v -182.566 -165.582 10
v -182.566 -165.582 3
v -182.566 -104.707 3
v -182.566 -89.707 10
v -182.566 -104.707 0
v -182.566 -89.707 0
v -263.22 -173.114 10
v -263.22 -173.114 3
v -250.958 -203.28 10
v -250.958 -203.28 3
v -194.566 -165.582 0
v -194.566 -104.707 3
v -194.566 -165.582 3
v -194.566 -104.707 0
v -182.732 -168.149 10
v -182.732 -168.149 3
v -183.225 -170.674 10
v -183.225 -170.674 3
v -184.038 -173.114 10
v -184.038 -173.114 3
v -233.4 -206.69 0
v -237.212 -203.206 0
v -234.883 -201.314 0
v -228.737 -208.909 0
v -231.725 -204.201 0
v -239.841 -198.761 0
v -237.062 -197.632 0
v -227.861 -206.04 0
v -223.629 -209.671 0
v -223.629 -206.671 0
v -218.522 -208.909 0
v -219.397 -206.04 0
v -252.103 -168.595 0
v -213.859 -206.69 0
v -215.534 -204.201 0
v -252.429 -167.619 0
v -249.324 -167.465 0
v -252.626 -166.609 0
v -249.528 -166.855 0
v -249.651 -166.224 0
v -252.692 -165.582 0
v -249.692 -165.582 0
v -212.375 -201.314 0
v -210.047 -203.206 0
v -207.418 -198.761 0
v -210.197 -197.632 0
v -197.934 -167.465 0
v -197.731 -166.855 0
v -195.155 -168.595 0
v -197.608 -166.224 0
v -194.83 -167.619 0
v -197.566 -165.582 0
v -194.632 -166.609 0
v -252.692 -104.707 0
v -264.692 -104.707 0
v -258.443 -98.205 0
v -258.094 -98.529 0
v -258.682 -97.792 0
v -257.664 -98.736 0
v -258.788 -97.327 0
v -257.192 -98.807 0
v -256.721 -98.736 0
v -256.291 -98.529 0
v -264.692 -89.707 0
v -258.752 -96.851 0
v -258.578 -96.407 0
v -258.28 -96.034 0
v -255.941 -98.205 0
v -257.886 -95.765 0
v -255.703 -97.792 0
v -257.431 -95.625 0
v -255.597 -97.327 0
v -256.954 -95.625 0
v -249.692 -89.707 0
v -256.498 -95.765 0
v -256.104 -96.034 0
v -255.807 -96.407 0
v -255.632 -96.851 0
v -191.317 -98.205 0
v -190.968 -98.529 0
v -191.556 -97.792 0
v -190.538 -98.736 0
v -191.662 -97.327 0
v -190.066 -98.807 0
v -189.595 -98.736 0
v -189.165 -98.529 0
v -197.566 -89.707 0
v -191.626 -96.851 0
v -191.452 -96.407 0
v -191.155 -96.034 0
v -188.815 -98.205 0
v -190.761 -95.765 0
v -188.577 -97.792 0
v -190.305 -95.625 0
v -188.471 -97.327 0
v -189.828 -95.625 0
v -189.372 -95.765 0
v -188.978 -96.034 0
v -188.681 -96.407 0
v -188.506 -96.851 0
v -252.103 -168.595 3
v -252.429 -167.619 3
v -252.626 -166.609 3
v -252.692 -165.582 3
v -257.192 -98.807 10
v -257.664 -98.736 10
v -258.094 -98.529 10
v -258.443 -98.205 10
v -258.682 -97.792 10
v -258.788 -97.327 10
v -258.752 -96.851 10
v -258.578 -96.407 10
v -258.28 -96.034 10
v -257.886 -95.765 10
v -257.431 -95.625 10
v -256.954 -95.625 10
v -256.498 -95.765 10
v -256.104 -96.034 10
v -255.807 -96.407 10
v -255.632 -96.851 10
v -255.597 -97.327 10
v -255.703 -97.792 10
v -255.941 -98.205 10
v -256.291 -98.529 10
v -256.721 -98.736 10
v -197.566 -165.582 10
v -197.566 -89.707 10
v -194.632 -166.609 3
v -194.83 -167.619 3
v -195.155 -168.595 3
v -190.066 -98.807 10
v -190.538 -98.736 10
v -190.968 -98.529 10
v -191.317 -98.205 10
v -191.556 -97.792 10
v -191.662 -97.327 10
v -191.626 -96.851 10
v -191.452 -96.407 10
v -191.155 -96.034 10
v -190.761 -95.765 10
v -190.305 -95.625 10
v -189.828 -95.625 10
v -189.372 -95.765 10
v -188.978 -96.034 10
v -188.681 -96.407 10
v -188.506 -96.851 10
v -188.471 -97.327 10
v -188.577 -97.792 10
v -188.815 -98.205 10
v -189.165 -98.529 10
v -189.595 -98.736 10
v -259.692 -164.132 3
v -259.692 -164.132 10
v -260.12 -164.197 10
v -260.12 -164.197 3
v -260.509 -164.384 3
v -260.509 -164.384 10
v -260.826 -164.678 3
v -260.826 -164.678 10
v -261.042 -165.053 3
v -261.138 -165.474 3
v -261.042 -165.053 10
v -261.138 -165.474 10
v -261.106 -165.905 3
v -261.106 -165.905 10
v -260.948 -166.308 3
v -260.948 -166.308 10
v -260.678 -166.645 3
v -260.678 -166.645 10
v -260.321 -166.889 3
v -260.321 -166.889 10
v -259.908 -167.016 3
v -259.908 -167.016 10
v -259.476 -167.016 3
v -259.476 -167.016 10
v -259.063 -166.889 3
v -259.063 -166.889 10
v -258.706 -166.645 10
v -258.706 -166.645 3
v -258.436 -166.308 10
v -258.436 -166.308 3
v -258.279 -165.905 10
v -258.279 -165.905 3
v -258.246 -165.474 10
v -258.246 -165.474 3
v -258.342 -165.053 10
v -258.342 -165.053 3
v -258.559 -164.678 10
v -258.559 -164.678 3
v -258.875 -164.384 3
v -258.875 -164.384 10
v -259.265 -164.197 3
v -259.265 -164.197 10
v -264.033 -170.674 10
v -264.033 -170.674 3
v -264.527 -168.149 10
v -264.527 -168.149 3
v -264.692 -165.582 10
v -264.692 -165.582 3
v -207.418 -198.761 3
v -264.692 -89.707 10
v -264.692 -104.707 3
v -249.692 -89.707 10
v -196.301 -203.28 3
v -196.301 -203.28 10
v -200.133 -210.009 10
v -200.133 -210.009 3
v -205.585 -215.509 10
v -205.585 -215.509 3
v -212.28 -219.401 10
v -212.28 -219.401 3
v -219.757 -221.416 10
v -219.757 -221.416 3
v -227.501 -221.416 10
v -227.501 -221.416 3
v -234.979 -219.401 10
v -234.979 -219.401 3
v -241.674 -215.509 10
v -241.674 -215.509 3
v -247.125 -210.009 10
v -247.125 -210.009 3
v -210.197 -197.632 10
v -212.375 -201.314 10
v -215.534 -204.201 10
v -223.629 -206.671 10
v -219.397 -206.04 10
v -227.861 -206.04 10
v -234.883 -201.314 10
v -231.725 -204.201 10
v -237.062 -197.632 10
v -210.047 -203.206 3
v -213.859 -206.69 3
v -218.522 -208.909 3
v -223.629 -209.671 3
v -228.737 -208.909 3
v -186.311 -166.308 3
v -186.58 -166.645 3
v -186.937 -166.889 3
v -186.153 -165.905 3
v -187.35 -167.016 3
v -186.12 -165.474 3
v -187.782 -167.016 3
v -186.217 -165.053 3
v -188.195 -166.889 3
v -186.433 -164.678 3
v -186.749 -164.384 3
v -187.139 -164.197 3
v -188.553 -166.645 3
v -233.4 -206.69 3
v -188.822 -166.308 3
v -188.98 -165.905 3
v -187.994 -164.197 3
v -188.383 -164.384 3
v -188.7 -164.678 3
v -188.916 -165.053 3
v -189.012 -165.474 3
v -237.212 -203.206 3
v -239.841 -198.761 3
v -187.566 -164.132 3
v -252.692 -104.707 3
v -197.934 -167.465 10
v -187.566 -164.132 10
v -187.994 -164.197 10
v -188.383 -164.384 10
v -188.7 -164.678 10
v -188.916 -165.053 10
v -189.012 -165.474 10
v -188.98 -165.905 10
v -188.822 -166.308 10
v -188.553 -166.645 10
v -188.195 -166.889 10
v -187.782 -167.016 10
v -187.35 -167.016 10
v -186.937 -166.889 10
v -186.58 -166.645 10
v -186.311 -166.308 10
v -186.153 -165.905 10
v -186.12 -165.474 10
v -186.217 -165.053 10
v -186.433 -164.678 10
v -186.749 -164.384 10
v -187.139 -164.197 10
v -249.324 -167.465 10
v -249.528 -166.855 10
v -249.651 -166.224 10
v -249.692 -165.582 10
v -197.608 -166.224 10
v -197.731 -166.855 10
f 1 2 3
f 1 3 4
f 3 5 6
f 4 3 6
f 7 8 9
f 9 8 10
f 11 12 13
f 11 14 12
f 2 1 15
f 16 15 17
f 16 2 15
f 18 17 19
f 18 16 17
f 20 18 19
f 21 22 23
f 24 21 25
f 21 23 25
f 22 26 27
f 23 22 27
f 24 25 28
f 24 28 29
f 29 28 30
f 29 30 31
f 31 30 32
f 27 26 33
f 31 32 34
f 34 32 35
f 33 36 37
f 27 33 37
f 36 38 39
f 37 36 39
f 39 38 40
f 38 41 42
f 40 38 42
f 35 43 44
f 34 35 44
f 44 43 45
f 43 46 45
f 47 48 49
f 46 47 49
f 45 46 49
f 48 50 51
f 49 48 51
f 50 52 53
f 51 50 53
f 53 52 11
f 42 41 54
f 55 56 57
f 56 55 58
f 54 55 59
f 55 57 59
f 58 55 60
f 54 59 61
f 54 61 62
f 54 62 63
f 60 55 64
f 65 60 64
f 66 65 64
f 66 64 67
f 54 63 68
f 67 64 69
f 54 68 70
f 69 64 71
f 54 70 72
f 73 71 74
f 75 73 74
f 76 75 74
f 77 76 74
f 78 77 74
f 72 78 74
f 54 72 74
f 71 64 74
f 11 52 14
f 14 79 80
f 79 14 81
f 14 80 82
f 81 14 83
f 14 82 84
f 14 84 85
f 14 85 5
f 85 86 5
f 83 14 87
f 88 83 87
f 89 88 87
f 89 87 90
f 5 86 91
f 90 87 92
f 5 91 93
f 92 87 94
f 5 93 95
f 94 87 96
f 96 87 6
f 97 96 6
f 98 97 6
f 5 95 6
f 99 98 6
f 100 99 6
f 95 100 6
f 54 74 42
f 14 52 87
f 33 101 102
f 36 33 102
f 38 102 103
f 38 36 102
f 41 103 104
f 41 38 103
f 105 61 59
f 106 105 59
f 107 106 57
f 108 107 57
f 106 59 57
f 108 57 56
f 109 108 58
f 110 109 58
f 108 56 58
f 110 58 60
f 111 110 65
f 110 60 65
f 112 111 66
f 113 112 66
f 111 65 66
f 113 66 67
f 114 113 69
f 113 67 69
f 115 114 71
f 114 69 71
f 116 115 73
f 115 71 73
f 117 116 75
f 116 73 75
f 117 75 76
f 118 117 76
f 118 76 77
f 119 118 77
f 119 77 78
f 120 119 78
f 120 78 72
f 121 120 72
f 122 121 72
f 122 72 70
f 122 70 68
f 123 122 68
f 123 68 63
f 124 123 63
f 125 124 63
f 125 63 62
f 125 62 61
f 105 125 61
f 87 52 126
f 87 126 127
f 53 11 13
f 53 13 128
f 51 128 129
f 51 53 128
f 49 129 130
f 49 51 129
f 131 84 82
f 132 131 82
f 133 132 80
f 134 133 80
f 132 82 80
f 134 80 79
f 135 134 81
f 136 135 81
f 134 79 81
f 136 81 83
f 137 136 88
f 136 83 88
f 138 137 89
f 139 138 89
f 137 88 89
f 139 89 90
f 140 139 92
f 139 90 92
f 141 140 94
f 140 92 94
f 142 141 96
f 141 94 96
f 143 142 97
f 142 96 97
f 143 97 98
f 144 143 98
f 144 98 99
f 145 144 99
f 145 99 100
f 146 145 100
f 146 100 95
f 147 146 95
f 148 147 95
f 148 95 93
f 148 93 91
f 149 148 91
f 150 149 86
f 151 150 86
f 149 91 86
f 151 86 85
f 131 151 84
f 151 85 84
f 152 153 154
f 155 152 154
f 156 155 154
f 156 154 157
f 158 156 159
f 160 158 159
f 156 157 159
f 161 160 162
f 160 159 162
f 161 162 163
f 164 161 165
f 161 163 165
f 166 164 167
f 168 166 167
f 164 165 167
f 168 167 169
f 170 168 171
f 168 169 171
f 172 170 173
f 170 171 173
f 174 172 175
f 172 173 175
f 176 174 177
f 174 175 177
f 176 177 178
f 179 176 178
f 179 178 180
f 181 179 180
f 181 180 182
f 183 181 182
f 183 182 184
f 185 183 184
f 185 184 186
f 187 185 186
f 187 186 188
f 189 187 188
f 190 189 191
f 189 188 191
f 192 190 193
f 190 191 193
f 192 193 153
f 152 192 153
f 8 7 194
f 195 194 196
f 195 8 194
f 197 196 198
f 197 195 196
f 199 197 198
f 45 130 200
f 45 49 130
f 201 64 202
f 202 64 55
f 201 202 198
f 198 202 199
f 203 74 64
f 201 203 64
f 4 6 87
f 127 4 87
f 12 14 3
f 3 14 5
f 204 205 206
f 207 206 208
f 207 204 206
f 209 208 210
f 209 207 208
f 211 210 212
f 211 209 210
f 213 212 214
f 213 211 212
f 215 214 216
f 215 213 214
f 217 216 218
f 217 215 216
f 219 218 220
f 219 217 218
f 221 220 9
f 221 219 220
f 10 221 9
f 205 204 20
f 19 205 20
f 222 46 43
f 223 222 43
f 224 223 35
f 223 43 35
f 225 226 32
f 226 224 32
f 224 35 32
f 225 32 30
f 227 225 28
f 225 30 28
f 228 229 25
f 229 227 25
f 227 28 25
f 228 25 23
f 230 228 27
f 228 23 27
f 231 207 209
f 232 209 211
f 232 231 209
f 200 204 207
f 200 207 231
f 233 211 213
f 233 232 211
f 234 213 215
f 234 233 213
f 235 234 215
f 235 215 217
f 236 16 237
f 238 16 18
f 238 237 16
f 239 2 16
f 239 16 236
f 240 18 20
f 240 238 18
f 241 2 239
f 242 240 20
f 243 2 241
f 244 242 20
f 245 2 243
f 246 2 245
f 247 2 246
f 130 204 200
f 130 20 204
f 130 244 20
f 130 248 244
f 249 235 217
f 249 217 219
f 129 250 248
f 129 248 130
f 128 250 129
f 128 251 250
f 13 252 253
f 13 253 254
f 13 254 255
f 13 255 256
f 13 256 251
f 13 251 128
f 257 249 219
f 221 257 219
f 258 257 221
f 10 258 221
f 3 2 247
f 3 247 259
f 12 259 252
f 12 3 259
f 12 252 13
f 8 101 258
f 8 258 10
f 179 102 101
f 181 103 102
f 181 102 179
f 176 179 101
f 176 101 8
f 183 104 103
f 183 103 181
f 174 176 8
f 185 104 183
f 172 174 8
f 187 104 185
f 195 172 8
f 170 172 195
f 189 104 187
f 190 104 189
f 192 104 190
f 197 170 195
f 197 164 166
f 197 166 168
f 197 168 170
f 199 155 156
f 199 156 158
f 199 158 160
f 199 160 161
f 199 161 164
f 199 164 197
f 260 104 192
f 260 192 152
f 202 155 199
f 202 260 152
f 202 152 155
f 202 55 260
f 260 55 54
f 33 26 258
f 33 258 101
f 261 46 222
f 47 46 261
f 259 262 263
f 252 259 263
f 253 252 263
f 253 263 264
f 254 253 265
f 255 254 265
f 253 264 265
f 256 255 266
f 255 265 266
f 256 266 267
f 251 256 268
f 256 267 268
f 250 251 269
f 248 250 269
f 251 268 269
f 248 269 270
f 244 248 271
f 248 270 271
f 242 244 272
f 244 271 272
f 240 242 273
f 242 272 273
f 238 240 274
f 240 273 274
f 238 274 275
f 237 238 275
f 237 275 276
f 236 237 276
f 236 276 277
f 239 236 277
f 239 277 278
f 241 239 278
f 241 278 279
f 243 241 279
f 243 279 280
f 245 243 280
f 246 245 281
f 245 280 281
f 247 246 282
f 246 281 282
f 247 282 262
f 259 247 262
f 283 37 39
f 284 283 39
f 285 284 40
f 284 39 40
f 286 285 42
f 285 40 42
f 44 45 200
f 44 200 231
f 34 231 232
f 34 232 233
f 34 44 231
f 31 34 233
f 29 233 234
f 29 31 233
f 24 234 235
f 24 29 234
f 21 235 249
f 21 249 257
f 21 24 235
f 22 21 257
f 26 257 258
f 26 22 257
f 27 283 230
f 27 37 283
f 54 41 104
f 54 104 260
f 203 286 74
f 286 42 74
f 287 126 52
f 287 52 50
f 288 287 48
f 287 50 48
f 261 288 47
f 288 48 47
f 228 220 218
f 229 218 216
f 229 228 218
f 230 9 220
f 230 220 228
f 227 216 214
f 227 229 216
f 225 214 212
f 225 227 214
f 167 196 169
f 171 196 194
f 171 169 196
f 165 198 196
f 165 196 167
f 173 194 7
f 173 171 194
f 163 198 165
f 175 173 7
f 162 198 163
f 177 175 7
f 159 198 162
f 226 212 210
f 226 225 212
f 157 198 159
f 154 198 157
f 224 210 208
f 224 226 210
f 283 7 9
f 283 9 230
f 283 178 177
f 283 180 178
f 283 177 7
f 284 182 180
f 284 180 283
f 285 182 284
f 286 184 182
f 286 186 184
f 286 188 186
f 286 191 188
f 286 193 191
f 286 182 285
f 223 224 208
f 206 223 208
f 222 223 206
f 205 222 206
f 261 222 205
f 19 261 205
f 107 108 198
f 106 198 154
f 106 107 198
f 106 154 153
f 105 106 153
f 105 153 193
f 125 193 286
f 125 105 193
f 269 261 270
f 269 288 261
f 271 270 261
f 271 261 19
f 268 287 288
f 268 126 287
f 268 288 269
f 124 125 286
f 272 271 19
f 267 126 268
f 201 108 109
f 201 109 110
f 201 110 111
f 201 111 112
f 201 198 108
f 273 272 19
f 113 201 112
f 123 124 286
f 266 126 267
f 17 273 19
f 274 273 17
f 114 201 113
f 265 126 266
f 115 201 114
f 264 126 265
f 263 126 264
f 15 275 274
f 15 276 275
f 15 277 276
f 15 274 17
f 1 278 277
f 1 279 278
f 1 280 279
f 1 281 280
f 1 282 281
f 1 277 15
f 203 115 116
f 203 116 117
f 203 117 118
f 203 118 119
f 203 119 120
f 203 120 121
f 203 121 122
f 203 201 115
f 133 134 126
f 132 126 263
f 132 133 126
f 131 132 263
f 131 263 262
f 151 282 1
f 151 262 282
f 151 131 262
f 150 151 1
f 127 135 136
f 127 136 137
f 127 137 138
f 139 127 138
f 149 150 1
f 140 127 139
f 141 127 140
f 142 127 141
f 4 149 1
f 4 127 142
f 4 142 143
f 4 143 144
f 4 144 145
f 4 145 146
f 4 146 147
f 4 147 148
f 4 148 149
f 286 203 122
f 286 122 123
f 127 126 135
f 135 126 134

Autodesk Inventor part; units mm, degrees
ref_plane "YZ Plane" through (0, 0, 0) normal (1, 0, 0) x (0, 1, 0)
ref_plane "XZ Plane" through (0, 0, 0) normal (0, 1, 0) x (-1, 0, 0)
ref_plane "XY Plane" through (0, 0, 0) normal (0, 0, 1) x (1, 0, 0)
sketch "Sketch13" plane through (0, 0, 0) normal (0, 0, 1) x (1, 0, 0)
  line L0 (-247.6922, -121.6988) -> (-240.7003, -114.707) projected
  line L1 (-240.7003, -114.707) -> (-206.5582, -114.707) projected
  line L2 (-206.5582, -114.707) -> (-199.5663, -121.6988) projected
  line L3 (-199.5663, -121.6988) -> (-199.5663, -165.5825) projected
  arc A0 (-199.7872, -166.7122) -> (-199.5663, -165.5825) centre (-202.5663, -165.5825) ccw projected
  line L4 (-199.7872, -166.7122) -> (-212.0494, -196.8785) projected
  arc A1 (-235.2091, -196.8785) -> (-212.0494, -196.8785) centre (-223.6293, -192.1714) ccw projected
  line L5 (-235.2091, -196.8785) -> (-247.4714, -166.7122) projected
  arc A2 (-247.6922, -165.5825) -> (-247.4714, -166.7122) centre (-244.6922, -165.5825) ccw projected
  line L6 (-247.6922, -165.5825) -> (-247.6922, -121.6988) projected
  circle A3 centre (-223.6293, -151.1714) radius 13 projected
  line L7 (26.8154, -89.707) -> (-473.1846, -89.707) projected
  line L8 (26.8154, -104.707) -> (-473.1846, -104.707) projected
  line L9 (-197.5663, -165.5825) -> (-197.5663, -120.8704)
  line L10 (-197.5663, -120.8704) -> (-205.7298, -112.707)
  line L11 (-205.7298, -112.707) -> (-241.5288, -112.707)
  line L12 (-241.5288, -112.707) -> (-249.6922, -120.8704)
  line L13 (-249.6922, -120.8704) -> (-249.6922, -165.5825)
  arc A4 (-249.6922, -165.5825) -> (-249.3242, -167.4653) centre (-244.6922, -165.5825) ccw
  line L14 (-249.3242, -167.4653) -> (-237.0619, -197.6316)
  arc A5 (-237.0619, -197.6316) -> (-210.1966, -197.6316) centre (-223.6293, -192.1714) ccw
  line L15 (-210.1966, -197.6316) -> (-197.9344, -167.4653)
  arc A6 (-197.9344, -167.4653) -> (-197.5663, -165.5825) centre (-202.5663, -165.5825) ccw
  line L16 (-182.5663, -165.5825) -> (-182.5663, -114.6572)
  line L17 (-182.5663, -114.6572) -> (-199.5166, -97.707)
  line L18 (-199.5166, -97.707) -> (-247.742, -97.707)
  line L19 (-247.742, -97.707) -> (-264.6922, -114.6572)
  line L20 (-264.6922, -114.6572) -> (-264.6922, -165.5825)
  arc A7 (-264.6922, -165.5825) -> (-263.22, -173.1138) centre (-244.6922, -165.5825) ccw
  line L21 (-263.22, -173.1138) -> (-250.9578, -203.2801)
  arc A8 (-250.9578, -203.2801) -> (-196.3008, -203.2801) centre (-223.6293, -192.1714) ccw
  line L22 (-196.3008, -203.2801) -> (-184.0385, -173.1138)
  arc A9 (-184.0385, -173.1138) -> (-182.5663, -165.5825) centre (-202.5663, -165.5825) ccw
  line L23 (-182.5663, -114.6572) -> (-182.5663, -89.707)
  line L24 (-264.6922, -114.6572) -> (-264.6922, -89.707)
  line L25 (-197.5663, -120.8704) -> (-197.5663, -89.707)
  line L26 (-249.6922, -120.8704) -> (-249.6922, -89.707)
  line L27 (-218.4828, -188.996) -> (-218.1293, -188.6424) projected
  line L28 (-218.1293, -188.6424) -> (-218.1293, -184.996) projected
  line L29 (-218.1293, -184.996) -> (-229.1293, -184.996) projected
  line L30 (-229.1293, -184.996) -> (-229.1293, -188.6424) projected
  line L31 (-229.1293, -188.6424) -> (-228.7757, -188.996) projected
  line L32 (-228.9525, -189.3022) -> (-229.4355, -189.1728) projected
  line L33 (-229.4355, -189.1728) -> (-232.5934, -190.996) projected
  line L34 (-223.806, -198.2161) -> (-228.9525, -189.3022) projected
  line L35 (-227.0934, -200.5223) -> (-223.9355, -198.6991) projected
  line L36 (-223.9355, -198.6991) -> (-223.806, -198.2161) projected
  line L37 (-223.4525, -198.2161) -> (-223.3231, -198.6991) projected
  line L38 (-223.3231, -198.6991) -> (-220.1652, -200.5223) projected
  line L39 (-218.306, -189.3022) -> (-223.4525, -198.2161) projected
  line L40 (-214.6652, -190.996) -> (-217.8231, -189.1728) projected
  line L41 (-217.8231, -189.1728) -> (-218.306, -189.3022) projected
  line L42 (-228.7757, -188.996) -> (-218.4828, -188.996) projected
  line L43 (-232.5934, -190.996) -> (-227.0934, -200.5223) projected
  line L44 (-220.1652, -200.5223) -> (-214.6652, -190.996) projected
  point P0 (0, 0)
  dimension "d26" = 2
  dimension "d27" = 15
extrude "Extrusion14" add sketch "Sketch13" along normal blind 10 contours L23 L8 L17 L25 L7 | L23 L17 L8 | L26 L19 L8 L24 L7 | L17 L8 L25 | L17 L16 A9 L22 A8 L21 A7 L20 L19 L8 L26 L13 A4 L14 A5 L15 A6 L9 L25 | L26 L8 L19 | L8 L19 L24
sketch "Sketch14" plane through (0, 0, 0) normal (0, 0, -1) x (-1, 0, 0)
  line L0 (249.6922, -165.5825) -> (249.6922, -89.707) projected
  arc A0 (249.3242, -167.4653) -> (249.6922, -165.5825) centre (244.6922, -165.5825) ccw projected
  line L1 (237.0619, -197.6316) -> (249.3242, -167.4653) projected
  arc A1 (210.1966, -197.6316) -> (237.0619, -197.6316) centre (223.6293, -192.1714) ccw projected
  line L2 (197.9344, -167.4653) -> (210.1966, -197.6316) projected
  arc A2 (197.5663, -165.5825) -> (197.9344, -167.4653) centre (202.5663, -165.5825) ccw projected
  line L3 (197.5663, -89.707) -> (197.5663, -165.5825) projected
  line L4 (182.5663, -89.707) -> (197.5663, -89.707) projected
  line L5 (182.5663, -165.5825) -> (182.5663, -89.707) projected
  arc A3 (182.5663, -165.5825) -> (184.0385, -173.1138) centre (202.5663, -165.5825) ccw projected
  line L6 (196.3008, -203.2801) -> (184.0385, -173.1138) projected
  arc A4 (196.3008, -203.2801) -> (250.9578, -203.2801) centre (223.6293, -192.1714) ccw projected
  line L7 (263.22, -173.1138) -> (250.9578, -203.2801) projected
  arc A5 (263.22, -173.1138) -> (264.6922, -165.5825) centre (244.6922, -165.5825) ccw projected
  line L8 (264.6922, -89.707) -> (264.6922, -165.5825) projected
  line L9 (249.6922, -89.707) -> (264.6922, -89.707) projected
  line L10 (185.5663, -92.707) -> (194.5663, -92.707)
  line L11 (194.5663, -92.707) -> (194.5663, -165.5825)
  arc A6 (194.5663, -165.5825) -> (195.1552, -168.595) centre (202.5663, -165.5825) ccw
  line L12 (195.1552, -168.595) -> (207.4175, -198.7613)
  arc A7 (207.4175, -198.7613) -> (239.8411, -198.7613) centre (223.6293, -192.1714) ccw
  line L13 (239.8411, -198.7613) -> (252.1033, -168.595)
  arc A8 (252.1033, -168.595) -> (252.6922, -165.5825) centre (244.6922, -165.5825) ccw
  line L14 (252.6922, -165.5825) -> (252.6922, -92.707)
  line L15 (252.6922, -92.707) -> (261.6922, -92.707)
  line L16 (261.6922, -92.707) -> (261.6922, -165.5825)
  arc A9 (260.4408, -171.9841) -> (261.6922, -165.5825) centre (244.6922, -165.5825) ccw
  line L17 (260.4408, -171.9841) -> (248.1786, -202.1504)
  arc A10 (199.0799, -202.1504) -> (248.1786, -202.1504) centre (223.6293, -192.1714) ccw
  line L18 (199.0799, -202.1504) -> (186.8177, -171.9841)
  arc A11 (185.5663, -165.5825) -> (186.8177, -171.9841) centre (202.5663, -165.5825) ccw
  line L19 (185.5663, -165.5825) -> (185.5663, -92.707)
  line L20 (194.5663, -92.707) -> (194.5663, -89.707)
  line L21 (182.5663, -89.707) -> (197.5663, -89.707) projected
  line L22 (252.6922, -92.707) -> (252.6922, -89.707)
  line L23 (197.5663, -89.707) -> (197.5663, -165.5825) projected
  line L24 (197.5663, -104.707) -> (182.5663, -104.707)
  line L25 (264.6922, -89.707) -> (264.6922, -165.5825) projected
  line L26 (264.6922, -104.707) -> (249.6922, -104.707)
  point P0 (0, 0)
  point P1 (194.5663, -104.707)
  point P2 (264.6922, -104.707)
  point P3 (252.6922, -104.707)
  dimension "d33" = 3
  dimension "d34" = 15
extrude "Extrusion15" cut sketch "Sketch14" against normal blind 3 contours L26 L16 A9 L17 A10 L18 A11 L19 L24 L11 A6 L12 A7 L13 A8 L14 | L26 L8 A5 L7 A4 L6 A3 L5 L24 L19 A11 L18 A10 L17 A9 L16
sketch "Sketch15" plane through (0, 0, 3) normal (0, 0, -1) x (-1, 0, 0)
  line L0 (182.5663, -165.5825) -> (182.5663, -104.707) projected
  line L1 (264.6922, -104.707) -> (264.6922, -165.5825) projected
  point P0 (0, 0)
  point P1 (187.5663, -165.5825)
  point P2 (259.6922, -165.5825)
  dimension "d35" = 5
  dimension "d36" = 5
hole "Hole1" at (-187.5663, -165.5825, 3) at (-259.6922, -165.5825, 3) direction (0, 0, 1) diameter 2.9 end through all
sketch "Sketch16" plane through (0, 0, 10) normal (0, 0, 1) x (1, 0, 0)
  line L0 (-264.6922, -89.707) -> (-264.6922, -165.5825) projected
  line L1 (-182.5663, -165.5825) -> (-182.5663, -89.707) projected
  point P0 (0, 0)
  point P1 (-257.1922, -97.207)
  point P2 (-190.0663, -97.207)
  dimension "d44" = 7.5
  dimension "d45" = 7.5
  dimension "d46" = 7.5
hole "Hole2" at (-257.1922, -97.207, 10) at (-190.0663, -97.207, 10) direction (0, 0, -1) diameter 3.2 end through all
equation "\"d36\" = d35"
equation "\"d45\" = d44"
equation "\"d46\" = d44"
properties part number "Rear Cover Bracket" material "ABS Plastic"
